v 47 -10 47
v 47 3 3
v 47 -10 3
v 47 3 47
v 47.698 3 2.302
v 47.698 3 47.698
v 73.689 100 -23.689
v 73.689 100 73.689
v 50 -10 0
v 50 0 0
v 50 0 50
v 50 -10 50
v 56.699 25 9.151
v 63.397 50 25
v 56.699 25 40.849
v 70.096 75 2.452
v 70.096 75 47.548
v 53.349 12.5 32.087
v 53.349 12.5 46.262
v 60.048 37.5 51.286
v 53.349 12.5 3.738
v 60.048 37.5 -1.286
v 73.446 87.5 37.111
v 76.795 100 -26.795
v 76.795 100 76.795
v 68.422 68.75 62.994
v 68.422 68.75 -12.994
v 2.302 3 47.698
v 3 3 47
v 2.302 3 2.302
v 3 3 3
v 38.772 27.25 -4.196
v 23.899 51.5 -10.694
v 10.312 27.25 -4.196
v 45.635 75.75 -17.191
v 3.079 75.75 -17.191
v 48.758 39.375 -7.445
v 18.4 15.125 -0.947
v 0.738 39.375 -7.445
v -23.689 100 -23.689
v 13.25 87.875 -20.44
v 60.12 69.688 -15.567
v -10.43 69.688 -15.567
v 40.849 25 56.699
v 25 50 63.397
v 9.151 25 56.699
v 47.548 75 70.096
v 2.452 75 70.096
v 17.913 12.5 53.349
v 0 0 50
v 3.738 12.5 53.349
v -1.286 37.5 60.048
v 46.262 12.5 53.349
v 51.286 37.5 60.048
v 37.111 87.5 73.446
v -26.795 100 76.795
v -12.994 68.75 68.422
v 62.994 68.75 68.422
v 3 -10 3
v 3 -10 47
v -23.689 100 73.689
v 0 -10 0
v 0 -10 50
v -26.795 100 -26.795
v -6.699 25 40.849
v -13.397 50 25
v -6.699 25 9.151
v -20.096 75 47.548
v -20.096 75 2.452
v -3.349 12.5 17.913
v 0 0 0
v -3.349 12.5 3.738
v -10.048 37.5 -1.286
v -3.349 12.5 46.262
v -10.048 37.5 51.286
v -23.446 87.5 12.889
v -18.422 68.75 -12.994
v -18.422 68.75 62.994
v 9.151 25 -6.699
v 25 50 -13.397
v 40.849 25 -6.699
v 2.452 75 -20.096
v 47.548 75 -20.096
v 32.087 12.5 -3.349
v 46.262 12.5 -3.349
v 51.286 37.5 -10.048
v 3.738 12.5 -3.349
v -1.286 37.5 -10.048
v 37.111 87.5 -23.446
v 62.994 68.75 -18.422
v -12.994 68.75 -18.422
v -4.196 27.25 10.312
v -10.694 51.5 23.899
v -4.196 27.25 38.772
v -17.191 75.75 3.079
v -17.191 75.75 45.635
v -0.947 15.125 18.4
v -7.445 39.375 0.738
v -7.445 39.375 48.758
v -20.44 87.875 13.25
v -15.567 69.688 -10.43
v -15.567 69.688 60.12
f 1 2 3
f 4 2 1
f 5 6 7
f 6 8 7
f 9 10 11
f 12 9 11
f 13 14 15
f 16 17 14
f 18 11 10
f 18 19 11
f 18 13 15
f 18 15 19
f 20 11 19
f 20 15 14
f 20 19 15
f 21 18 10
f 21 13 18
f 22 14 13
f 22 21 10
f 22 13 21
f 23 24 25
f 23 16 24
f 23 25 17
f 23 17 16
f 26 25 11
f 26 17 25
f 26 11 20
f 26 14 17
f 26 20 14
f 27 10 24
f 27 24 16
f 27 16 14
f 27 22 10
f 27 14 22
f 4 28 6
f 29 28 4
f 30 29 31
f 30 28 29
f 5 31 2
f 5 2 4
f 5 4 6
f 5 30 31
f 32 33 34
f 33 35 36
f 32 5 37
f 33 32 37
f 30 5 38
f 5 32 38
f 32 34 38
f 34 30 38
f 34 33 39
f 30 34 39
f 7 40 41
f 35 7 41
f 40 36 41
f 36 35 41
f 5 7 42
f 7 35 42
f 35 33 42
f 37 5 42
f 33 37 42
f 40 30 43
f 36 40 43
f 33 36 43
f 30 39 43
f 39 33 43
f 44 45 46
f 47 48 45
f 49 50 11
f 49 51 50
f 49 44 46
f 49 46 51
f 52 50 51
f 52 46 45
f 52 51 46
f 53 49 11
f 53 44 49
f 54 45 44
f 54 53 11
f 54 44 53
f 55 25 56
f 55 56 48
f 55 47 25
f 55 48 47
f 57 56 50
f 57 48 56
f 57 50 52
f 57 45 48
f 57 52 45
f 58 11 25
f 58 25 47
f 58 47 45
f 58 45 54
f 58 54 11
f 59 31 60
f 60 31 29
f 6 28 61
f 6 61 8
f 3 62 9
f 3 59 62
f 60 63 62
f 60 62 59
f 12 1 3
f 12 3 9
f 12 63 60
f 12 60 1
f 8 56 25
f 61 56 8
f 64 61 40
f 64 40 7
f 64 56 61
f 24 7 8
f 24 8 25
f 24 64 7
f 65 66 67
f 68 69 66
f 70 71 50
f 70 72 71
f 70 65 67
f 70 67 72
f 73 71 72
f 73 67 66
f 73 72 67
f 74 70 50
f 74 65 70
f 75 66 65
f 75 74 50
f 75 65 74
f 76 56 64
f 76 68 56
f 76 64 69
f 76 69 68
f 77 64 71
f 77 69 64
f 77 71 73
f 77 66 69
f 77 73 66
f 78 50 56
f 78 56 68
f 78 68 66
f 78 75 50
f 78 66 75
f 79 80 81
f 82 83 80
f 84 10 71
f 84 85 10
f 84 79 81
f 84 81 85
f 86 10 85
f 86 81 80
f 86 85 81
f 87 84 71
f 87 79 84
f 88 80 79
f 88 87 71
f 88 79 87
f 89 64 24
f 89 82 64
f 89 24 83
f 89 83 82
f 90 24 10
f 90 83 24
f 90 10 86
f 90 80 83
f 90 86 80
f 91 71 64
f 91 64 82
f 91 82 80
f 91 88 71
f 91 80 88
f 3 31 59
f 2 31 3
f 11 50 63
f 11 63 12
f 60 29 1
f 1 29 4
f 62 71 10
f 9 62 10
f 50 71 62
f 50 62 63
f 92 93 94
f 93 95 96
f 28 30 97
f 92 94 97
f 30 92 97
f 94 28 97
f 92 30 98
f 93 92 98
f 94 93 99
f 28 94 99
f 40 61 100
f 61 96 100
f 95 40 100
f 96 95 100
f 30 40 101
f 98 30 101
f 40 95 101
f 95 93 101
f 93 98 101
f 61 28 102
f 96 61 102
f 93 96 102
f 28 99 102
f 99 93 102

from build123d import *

# Parameters (mm, degrees)
SKETCH1_W           = 50
SKETCH1_H           = 50
BOSS_EXTRUDE1_DEPTH = 100
BOSS_EXTRUDE1_TAPER = -15
SHELL1_T            = -3
SKETCH2_W           = 44
SKETCH2_H           = 44
CUT_EXTRUDE1_DEPTH  = 101.000000137
SKETCH3_W           = 50
SKETCH3_H           = 50
SKETCH3_W_2         = 44
SKETCH3_H_2         = 44
BOSS_EXTRUDE2_DEPTH = 10


with BuildPart() as part:
    # Sketch1 → Boss-Extrude1 (new body)
    with BuildSketch(Plane(origin=(0, 0, 0), x_dir=(1, 0, 0), z_dir=(0, 1, 0))):
        with Locations((25, -25)):
            Rectangle(SKETCH1_W, SKETCH1_H)
    extrude(amount=BOSS_EXTRUDE1_DEPTH, taper=BOSS_EXTRUDE1_TAPER)

    # Shell1
    shell1_openings = [part.faces().sort_by_distance(p)[0] for p in [
        (25, 100, 25),
    ]]
    offset(amount=SHELL1_T, openings=shell1_openings, kind=Kind.INTERSECTION)

    # Sketch2 → Cut-Extrude1 (cut, through all)
    with BuildSketch(Plane.XZ):
        with Locations((25, 25)):
            Rectangle(SKETCH2_W, SKETCH2_H)
    extrude(amount=-CUT_EXTRUDE1_DEPTH, mode=Mode.SUBTRACT)

    # Sketch3 → Boss-Extrude2 (add)
    with BuildSketch(Plane.XZ):
        with Locations((25, 25)):
            Rectangle(SKETCH3_W, SKETCH3_H)
        with Locations((25, 25)):
            Rectangle(SKETCH3_W_2, SKETCH3_H_2, mode=Mode.SUBTRACT)
    extrude(amount=BOSS_EXTRUDE2_DEPTH)


solid = part.part
